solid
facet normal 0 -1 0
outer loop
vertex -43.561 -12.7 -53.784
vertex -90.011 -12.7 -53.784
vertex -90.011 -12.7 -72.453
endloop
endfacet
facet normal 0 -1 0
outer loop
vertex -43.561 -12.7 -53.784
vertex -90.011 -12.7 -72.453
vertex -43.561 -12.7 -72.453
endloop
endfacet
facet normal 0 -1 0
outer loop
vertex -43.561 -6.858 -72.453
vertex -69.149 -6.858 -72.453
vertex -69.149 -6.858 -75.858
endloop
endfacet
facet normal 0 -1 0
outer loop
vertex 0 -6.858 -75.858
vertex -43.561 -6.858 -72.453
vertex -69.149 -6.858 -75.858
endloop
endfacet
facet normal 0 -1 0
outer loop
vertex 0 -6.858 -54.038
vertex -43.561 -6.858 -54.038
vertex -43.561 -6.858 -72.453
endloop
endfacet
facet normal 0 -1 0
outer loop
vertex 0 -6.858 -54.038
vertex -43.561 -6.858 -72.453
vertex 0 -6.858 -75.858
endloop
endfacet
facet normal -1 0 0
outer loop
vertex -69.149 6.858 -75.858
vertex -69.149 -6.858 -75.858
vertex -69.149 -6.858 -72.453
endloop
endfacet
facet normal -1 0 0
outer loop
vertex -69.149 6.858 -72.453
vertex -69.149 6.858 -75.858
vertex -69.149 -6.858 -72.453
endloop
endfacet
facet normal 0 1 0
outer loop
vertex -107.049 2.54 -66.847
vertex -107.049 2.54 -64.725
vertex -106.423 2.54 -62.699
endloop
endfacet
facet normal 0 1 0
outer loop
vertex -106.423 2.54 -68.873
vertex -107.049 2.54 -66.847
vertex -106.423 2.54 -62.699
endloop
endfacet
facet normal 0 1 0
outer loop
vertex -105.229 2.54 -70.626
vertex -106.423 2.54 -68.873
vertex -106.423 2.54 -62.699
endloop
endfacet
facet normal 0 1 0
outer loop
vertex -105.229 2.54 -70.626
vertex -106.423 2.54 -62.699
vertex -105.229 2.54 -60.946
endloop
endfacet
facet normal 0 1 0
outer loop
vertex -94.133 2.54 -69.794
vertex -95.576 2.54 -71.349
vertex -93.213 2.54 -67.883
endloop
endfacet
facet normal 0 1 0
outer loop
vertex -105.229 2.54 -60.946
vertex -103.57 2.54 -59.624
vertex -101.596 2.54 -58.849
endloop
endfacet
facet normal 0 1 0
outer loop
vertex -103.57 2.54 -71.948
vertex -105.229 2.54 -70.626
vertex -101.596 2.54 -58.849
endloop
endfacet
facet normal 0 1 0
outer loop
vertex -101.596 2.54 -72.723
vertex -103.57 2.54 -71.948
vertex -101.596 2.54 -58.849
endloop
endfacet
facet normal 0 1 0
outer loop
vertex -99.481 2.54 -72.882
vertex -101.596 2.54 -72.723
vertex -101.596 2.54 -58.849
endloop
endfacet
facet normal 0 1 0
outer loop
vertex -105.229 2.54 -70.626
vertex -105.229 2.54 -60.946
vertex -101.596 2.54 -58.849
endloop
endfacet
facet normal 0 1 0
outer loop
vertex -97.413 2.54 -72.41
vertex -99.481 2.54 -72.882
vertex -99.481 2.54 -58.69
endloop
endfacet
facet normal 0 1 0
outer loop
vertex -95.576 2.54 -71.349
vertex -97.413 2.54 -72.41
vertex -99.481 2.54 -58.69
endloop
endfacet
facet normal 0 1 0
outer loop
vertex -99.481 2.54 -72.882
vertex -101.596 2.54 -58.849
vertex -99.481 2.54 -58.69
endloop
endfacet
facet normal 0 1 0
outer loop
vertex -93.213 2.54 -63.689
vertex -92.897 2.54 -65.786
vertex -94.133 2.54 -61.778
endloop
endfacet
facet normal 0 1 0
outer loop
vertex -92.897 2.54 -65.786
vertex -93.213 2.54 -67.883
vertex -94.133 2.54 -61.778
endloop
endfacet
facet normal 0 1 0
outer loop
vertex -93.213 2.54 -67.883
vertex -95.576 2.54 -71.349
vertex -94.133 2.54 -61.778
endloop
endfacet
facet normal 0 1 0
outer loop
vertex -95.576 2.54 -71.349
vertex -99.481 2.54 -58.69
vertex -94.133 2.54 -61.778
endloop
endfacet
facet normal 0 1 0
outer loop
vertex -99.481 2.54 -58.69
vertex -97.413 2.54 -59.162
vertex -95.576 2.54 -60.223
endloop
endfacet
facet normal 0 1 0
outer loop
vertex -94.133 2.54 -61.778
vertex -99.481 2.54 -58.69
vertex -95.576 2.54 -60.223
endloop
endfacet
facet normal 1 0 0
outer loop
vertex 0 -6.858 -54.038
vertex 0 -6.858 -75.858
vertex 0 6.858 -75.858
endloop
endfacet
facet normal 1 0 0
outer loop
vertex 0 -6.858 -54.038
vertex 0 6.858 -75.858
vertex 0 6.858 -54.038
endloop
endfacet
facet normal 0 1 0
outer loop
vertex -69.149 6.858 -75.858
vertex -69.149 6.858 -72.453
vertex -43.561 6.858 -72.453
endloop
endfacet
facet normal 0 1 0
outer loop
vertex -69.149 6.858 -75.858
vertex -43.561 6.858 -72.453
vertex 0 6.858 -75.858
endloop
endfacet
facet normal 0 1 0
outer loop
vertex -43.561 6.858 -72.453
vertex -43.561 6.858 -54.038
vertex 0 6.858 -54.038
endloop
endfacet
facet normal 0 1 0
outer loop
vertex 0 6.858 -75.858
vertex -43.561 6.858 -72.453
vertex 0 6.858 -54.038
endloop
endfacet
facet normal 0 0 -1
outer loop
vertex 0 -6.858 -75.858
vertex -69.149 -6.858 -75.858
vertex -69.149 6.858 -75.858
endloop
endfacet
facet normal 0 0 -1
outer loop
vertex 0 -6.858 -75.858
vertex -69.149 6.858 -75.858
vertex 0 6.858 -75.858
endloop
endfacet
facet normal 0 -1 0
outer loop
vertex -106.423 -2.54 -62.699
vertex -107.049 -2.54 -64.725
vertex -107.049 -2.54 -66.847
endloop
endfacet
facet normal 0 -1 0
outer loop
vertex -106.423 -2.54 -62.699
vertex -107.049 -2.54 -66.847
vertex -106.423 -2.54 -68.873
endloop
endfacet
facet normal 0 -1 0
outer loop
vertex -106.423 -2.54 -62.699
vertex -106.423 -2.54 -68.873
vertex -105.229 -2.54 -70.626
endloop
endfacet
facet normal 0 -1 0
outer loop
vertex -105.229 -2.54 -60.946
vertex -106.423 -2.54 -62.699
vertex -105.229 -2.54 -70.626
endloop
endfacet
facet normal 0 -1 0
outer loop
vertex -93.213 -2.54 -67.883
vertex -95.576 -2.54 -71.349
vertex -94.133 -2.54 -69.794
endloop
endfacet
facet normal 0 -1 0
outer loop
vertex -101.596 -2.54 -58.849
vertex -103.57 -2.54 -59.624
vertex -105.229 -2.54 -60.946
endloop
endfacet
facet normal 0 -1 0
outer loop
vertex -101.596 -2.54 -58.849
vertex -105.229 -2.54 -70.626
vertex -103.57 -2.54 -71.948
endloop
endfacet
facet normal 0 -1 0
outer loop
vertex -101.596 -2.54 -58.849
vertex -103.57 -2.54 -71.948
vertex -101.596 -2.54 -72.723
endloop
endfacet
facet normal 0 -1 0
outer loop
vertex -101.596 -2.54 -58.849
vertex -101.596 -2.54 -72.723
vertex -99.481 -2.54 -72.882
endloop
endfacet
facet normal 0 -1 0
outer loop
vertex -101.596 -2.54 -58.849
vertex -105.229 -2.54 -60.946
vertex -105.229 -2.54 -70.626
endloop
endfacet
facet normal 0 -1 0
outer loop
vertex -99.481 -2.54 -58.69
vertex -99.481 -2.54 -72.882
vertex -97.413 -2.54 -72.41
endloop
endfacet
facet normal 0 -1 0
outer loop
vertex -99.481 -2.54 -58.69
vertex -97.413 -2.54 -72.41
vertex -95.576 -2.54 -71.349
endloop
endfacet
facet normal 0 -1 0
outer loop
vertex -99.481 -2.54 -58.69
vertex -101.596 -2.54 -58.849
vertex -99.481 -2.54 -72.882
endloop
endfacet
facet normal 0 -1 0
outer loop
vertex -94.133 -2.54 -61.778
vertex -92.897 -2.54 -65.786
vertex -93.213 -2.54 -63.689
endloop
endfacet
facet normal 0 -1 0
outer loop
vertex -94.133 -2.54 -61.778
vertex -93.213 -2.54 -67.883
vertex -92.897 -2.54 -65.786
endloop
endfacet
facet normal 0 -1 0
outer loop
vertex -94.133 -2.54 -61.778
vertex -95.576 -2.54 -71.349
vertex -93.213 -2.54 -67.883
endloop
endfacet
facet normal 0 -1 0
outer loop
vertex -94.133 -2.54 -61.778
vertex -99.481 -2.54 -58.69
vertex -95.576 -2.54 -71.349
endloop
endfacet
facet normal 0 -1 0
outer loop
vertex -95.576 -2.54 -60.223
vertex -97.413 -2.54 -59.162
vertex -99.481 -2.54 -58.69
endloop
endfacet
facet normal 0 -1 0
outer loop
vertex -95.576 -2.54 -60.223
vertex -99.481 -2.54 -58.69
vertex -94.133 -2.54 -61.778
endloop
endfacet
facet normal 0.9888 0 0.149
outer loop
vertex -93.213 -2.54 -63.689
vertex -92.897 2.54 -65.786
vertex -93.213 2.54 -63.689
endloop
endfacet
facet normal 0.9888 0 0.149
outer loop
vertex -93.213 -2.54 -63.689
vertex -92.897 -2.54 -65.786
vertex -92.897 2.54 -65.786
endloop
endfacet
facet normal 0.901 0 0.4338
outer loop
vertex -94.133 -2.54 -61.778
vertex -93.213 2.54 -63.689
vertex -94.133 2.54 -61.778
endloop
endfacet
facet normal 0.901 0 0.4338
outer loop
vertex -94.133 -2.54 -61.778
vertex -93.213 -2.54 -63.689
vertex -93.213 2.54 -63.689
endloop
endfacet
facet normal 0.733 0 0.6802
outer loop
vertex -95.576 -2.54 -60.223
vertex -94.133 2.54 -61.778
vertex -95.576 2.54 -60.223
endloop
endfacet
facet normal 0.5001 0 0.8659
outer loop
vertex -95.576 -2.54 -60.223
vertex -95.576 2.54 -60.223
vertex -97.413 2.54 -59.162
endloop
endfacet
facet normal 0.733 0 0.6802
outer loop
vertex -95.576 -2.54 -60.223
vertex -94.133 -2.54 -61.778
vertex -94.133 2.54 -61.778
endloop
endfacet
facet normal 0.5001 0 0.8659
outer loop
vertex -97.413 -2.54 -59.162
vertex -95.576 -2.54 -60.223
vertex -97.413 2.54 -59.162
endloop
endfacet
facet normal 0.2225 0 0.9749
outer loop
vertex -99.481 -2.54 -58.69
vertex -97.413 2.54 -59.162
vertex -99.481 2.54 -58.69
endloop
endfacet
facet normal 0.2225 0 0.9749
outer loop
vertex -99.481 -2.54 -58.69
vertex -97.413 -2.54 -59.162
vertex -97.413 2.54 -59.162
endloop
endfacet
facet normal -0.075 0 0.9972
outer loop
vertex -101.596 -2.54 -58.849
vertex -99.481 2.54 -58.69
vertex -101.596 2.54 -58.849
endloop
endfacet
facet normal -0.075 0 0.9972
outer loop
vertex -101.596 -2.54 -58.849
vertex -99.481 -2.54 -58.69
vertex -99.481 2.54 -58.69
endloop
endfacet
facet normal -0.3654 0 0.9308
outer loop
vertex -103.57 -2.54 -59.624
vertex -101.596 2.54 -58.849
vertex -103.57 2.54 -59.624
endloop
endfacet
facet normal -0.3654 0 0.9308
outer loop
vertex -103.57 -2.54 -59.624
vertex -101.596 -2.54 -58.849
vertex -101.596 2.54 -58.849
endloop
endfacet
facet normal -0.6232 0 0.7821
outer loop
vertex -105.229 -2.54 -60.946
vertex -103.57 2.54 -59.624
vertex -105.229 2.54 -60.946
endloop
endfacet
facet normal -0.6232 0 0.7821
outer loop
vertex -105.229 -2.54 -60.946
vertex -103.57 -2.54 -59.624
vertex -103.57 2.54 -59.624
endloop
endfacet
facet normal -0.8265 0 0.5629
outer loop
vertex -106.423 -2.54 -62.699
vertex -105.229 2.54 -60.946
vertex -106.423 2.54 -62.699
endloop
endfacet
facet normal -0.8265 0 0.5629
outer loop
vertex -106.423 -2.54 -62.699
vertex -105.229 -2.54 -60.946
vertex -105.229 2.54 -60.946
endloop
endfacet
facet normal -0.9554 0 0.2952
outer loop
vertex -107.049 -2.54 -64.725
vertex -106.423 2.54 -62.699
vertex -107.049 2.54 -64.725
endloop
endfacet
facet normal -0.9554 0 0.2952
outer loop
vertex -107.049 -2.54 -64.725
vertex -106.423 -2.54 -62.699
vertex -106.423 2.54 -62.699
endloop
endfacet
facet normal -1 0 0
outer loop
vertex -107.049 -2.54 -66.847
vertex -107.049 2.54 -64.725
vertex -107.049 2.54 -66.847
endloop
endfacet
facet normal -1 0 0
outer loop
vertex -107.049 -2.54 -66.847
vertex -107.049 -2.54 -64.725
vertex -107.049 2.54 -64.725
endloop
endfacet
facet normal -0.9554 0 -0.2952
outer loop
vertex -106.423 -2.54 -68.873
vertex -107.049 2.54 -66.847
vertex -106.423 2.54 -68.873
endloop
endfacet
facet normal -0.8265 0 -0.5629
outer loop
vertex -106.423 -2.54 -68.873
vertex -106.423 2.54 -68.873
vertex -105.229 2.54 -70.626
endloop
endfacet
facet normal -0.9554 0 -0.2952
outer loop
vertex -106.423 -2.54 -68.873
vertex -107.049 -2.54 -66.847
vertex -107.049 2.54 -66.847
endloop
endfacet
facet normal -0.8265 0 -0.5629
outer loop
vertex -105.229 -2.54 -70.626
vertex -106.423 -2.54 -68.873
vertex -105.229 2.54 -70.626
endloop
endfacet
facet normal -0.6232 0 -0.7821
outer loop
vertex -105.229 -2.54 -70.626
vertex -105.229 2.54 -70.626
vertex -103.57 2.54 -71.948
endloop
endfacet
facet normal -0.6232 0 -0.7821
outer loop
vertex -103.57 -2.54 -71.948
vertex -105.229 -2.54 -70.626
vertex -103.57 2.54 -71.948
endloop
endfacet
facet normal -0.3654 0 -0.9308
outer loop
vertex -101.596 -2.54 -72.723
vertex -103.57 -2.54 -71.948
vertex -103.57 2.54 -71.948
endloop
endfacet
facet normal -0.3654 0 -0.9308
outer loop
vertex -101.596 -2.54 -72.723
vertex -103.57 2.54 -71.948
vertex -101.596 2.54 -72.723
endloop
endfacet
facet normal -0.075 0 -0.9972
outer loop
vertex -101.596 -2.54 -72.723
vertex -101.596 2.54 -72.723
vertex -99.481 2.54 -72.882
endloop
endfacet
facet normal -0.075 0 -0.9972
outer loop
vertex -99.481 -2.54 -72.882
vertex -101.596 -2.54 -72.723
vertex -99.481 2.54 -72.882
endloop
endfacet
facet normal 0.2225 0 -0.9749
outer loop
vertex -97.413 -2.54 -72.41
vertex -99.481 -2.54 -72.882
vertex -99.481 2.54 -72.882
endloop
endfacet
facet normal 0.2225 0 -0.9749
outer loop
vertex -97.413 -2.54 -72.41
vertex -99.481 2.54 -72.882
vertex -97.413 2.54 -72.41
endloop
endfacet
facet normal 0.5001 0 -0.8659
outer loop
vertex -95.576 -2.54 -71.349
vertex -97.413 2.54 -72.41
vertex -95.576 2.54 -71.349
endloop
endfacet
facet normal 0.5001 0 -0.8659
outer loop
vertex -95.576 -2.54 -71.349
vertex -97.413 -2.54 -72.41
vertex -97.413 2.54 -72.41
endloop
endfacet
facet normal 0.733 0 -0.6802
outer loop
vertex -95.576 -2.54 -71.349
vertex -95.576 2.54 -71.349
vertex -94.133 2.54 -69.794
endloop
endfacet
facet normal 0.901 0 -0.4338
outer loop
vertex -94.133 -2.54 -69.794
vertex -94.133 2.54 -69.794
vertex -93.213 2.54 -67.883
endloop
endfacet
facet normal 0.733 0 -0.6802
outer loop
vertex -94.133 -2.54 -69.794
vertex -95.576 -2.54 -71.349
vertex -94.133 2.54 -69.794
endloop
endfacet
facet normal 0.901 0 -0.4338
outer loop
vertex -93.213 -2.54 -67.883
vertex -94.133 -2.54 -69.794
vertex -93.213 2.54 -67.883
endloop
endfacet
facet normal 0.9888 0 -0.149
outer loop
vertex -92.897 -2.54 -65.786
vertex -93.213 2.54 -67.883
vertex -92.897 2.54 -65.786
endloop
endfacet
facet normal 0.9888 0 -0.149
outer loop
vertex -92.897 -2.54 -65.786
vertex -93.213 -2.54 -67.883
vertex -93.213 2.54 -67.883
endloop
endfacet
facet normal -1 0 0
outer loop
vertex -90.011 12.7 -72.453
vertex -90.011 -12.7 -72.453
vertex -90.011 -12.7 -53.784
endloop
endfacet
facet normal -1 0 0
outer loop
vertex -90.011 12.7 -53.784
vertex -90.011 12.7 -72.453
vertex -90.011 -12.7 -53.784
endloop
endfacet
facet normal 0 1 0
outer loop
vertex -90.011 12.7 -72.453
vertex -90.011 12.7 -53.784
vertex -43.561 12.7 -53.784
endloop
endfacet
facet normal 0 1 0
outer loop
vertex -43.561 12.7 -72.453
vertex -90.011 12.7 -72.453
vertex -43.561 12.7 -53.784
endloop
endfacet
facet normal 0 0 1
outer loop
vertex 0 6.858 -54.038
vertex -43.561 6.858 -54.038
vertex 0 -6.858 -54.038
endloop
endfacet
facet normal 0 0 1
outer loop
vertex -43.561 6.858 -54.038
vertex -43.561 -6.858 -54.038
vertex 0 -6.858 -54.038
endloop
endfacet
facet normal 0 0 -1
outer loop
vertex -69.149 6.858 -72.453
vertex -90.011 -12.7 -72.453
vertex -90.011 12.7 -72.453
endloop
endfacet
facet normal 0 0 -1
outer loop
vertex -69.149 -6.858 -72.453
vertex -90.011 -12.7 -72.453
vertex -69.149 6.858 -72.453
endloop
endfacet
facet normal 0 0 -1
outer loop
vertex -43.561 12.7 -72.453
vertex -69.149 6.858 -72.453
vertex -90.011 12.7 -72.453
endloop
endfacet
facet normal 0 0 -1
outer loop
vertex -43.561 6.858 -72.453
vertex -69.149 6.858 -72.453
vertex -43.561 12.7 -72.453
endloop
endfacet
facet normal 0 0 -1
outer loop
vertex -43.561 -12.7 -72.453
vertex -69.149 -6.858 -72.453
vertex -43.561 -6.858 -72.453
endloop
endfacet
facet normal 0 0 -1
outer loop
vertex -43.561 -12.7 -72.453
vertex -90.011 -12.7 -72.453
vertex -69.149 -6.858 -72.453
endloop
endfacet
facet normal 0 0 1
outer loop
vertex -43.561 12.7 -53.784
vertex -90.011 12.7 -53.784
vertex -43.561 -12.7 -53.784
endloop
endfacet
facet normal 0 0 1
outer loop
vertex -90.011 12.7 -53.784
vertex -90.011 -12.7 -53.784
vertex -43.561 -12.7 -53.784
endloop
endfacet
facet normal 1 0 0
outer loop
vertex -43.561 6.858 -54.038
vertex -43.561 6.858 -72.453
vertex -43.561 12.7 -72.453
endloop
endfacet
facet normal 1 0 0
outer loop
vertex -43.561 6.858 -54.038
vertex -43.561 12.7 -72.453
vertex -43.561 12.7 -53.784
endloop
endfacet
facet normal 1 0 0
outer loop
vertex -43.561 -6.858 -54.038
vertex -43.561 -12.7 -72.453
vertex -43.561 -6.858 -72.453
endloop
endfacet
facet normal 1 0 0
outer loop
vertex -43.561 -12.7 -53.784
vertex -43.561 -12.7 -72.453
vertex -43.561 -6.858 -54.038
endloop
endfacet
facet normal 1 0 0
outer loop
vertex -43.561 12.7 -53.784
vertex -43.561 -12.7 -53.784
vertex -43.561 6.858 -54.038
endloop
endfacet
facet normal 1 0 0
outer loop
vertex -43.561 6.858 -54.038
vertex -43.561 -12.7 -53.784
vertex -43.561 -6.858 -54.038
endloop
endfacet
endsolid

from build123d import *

# Parameters (mm, degrees)
F0_W     = 46.4502461255
F0_H     = 18.6690017581
F3_DEPTH = 12.7
F4_DEPTH = 12.7
F1_R     = 7.1154754627
F5_DEPTH = 2.54
F6_DEPTH = 2.54
F2_W     = 69.1488236189
F2_H     = 21.8198187649
F7_DEPTH = 6.858
F8_DEPTH = 6.858


# Not quite as in the source:
# - the program builds the solid bodies; features that only make, move or delete a surface that nothing else refers to are left out


with BuildPart() as f3:
    # F0 (on Front) → F3 (new body)
    with BuildSketch(Plane.XZ):
        with Locations((-66.7861234397, -63.1189979613)):
            Rectangle(F0_W, F0_H)
    extrude(amount=F3_DEPTH)

    # F4 (add): a face of the model
    f4_faces = [f3.faces().sort_by_distance(p)[0] for p in [
        (-66.7861234397, 0, -63.1189979613),
    ]]
    extrude(f4_faces, amount=F4_DEPTH)

    # F2 (on Front) → F7 (join)
    with BuildSketch(Plane.XZ):
        with Locations((-34.5744118094, -64.9482440203)):
            Rectangle(F2_W, F2_H)
    extrude(amount=F7_DEPTH)

    # F8 (add): a face of the model
    f8_faces = [f3.faces().sort_by_distance(p)[0] for p in [
        (-24.68336426, 0, -65.7213116697),
    ]]
    extrude(f8_faces, amount=F8_DEPTH)


with BuildPart() as f5:
    # F1 (on Front) → F5 (new body)
    with BuildSketch(Plane.XZ):
        with Locations((-100.0125035644, -65.7860040665)):
            Circle(F1_R)
    extrude(amount=F5_DEPTH)

    # F6 (add): a face of the model
    f6_faces = [f5.faces().sort_by_distance(p)[0] for p in [
        (-100.0125035644, 0, -65.7860040665),
    ]]
    extrude(f6_faces, amount=F6_DEPTH)


solid = Compound([f3.part, f5.part])
